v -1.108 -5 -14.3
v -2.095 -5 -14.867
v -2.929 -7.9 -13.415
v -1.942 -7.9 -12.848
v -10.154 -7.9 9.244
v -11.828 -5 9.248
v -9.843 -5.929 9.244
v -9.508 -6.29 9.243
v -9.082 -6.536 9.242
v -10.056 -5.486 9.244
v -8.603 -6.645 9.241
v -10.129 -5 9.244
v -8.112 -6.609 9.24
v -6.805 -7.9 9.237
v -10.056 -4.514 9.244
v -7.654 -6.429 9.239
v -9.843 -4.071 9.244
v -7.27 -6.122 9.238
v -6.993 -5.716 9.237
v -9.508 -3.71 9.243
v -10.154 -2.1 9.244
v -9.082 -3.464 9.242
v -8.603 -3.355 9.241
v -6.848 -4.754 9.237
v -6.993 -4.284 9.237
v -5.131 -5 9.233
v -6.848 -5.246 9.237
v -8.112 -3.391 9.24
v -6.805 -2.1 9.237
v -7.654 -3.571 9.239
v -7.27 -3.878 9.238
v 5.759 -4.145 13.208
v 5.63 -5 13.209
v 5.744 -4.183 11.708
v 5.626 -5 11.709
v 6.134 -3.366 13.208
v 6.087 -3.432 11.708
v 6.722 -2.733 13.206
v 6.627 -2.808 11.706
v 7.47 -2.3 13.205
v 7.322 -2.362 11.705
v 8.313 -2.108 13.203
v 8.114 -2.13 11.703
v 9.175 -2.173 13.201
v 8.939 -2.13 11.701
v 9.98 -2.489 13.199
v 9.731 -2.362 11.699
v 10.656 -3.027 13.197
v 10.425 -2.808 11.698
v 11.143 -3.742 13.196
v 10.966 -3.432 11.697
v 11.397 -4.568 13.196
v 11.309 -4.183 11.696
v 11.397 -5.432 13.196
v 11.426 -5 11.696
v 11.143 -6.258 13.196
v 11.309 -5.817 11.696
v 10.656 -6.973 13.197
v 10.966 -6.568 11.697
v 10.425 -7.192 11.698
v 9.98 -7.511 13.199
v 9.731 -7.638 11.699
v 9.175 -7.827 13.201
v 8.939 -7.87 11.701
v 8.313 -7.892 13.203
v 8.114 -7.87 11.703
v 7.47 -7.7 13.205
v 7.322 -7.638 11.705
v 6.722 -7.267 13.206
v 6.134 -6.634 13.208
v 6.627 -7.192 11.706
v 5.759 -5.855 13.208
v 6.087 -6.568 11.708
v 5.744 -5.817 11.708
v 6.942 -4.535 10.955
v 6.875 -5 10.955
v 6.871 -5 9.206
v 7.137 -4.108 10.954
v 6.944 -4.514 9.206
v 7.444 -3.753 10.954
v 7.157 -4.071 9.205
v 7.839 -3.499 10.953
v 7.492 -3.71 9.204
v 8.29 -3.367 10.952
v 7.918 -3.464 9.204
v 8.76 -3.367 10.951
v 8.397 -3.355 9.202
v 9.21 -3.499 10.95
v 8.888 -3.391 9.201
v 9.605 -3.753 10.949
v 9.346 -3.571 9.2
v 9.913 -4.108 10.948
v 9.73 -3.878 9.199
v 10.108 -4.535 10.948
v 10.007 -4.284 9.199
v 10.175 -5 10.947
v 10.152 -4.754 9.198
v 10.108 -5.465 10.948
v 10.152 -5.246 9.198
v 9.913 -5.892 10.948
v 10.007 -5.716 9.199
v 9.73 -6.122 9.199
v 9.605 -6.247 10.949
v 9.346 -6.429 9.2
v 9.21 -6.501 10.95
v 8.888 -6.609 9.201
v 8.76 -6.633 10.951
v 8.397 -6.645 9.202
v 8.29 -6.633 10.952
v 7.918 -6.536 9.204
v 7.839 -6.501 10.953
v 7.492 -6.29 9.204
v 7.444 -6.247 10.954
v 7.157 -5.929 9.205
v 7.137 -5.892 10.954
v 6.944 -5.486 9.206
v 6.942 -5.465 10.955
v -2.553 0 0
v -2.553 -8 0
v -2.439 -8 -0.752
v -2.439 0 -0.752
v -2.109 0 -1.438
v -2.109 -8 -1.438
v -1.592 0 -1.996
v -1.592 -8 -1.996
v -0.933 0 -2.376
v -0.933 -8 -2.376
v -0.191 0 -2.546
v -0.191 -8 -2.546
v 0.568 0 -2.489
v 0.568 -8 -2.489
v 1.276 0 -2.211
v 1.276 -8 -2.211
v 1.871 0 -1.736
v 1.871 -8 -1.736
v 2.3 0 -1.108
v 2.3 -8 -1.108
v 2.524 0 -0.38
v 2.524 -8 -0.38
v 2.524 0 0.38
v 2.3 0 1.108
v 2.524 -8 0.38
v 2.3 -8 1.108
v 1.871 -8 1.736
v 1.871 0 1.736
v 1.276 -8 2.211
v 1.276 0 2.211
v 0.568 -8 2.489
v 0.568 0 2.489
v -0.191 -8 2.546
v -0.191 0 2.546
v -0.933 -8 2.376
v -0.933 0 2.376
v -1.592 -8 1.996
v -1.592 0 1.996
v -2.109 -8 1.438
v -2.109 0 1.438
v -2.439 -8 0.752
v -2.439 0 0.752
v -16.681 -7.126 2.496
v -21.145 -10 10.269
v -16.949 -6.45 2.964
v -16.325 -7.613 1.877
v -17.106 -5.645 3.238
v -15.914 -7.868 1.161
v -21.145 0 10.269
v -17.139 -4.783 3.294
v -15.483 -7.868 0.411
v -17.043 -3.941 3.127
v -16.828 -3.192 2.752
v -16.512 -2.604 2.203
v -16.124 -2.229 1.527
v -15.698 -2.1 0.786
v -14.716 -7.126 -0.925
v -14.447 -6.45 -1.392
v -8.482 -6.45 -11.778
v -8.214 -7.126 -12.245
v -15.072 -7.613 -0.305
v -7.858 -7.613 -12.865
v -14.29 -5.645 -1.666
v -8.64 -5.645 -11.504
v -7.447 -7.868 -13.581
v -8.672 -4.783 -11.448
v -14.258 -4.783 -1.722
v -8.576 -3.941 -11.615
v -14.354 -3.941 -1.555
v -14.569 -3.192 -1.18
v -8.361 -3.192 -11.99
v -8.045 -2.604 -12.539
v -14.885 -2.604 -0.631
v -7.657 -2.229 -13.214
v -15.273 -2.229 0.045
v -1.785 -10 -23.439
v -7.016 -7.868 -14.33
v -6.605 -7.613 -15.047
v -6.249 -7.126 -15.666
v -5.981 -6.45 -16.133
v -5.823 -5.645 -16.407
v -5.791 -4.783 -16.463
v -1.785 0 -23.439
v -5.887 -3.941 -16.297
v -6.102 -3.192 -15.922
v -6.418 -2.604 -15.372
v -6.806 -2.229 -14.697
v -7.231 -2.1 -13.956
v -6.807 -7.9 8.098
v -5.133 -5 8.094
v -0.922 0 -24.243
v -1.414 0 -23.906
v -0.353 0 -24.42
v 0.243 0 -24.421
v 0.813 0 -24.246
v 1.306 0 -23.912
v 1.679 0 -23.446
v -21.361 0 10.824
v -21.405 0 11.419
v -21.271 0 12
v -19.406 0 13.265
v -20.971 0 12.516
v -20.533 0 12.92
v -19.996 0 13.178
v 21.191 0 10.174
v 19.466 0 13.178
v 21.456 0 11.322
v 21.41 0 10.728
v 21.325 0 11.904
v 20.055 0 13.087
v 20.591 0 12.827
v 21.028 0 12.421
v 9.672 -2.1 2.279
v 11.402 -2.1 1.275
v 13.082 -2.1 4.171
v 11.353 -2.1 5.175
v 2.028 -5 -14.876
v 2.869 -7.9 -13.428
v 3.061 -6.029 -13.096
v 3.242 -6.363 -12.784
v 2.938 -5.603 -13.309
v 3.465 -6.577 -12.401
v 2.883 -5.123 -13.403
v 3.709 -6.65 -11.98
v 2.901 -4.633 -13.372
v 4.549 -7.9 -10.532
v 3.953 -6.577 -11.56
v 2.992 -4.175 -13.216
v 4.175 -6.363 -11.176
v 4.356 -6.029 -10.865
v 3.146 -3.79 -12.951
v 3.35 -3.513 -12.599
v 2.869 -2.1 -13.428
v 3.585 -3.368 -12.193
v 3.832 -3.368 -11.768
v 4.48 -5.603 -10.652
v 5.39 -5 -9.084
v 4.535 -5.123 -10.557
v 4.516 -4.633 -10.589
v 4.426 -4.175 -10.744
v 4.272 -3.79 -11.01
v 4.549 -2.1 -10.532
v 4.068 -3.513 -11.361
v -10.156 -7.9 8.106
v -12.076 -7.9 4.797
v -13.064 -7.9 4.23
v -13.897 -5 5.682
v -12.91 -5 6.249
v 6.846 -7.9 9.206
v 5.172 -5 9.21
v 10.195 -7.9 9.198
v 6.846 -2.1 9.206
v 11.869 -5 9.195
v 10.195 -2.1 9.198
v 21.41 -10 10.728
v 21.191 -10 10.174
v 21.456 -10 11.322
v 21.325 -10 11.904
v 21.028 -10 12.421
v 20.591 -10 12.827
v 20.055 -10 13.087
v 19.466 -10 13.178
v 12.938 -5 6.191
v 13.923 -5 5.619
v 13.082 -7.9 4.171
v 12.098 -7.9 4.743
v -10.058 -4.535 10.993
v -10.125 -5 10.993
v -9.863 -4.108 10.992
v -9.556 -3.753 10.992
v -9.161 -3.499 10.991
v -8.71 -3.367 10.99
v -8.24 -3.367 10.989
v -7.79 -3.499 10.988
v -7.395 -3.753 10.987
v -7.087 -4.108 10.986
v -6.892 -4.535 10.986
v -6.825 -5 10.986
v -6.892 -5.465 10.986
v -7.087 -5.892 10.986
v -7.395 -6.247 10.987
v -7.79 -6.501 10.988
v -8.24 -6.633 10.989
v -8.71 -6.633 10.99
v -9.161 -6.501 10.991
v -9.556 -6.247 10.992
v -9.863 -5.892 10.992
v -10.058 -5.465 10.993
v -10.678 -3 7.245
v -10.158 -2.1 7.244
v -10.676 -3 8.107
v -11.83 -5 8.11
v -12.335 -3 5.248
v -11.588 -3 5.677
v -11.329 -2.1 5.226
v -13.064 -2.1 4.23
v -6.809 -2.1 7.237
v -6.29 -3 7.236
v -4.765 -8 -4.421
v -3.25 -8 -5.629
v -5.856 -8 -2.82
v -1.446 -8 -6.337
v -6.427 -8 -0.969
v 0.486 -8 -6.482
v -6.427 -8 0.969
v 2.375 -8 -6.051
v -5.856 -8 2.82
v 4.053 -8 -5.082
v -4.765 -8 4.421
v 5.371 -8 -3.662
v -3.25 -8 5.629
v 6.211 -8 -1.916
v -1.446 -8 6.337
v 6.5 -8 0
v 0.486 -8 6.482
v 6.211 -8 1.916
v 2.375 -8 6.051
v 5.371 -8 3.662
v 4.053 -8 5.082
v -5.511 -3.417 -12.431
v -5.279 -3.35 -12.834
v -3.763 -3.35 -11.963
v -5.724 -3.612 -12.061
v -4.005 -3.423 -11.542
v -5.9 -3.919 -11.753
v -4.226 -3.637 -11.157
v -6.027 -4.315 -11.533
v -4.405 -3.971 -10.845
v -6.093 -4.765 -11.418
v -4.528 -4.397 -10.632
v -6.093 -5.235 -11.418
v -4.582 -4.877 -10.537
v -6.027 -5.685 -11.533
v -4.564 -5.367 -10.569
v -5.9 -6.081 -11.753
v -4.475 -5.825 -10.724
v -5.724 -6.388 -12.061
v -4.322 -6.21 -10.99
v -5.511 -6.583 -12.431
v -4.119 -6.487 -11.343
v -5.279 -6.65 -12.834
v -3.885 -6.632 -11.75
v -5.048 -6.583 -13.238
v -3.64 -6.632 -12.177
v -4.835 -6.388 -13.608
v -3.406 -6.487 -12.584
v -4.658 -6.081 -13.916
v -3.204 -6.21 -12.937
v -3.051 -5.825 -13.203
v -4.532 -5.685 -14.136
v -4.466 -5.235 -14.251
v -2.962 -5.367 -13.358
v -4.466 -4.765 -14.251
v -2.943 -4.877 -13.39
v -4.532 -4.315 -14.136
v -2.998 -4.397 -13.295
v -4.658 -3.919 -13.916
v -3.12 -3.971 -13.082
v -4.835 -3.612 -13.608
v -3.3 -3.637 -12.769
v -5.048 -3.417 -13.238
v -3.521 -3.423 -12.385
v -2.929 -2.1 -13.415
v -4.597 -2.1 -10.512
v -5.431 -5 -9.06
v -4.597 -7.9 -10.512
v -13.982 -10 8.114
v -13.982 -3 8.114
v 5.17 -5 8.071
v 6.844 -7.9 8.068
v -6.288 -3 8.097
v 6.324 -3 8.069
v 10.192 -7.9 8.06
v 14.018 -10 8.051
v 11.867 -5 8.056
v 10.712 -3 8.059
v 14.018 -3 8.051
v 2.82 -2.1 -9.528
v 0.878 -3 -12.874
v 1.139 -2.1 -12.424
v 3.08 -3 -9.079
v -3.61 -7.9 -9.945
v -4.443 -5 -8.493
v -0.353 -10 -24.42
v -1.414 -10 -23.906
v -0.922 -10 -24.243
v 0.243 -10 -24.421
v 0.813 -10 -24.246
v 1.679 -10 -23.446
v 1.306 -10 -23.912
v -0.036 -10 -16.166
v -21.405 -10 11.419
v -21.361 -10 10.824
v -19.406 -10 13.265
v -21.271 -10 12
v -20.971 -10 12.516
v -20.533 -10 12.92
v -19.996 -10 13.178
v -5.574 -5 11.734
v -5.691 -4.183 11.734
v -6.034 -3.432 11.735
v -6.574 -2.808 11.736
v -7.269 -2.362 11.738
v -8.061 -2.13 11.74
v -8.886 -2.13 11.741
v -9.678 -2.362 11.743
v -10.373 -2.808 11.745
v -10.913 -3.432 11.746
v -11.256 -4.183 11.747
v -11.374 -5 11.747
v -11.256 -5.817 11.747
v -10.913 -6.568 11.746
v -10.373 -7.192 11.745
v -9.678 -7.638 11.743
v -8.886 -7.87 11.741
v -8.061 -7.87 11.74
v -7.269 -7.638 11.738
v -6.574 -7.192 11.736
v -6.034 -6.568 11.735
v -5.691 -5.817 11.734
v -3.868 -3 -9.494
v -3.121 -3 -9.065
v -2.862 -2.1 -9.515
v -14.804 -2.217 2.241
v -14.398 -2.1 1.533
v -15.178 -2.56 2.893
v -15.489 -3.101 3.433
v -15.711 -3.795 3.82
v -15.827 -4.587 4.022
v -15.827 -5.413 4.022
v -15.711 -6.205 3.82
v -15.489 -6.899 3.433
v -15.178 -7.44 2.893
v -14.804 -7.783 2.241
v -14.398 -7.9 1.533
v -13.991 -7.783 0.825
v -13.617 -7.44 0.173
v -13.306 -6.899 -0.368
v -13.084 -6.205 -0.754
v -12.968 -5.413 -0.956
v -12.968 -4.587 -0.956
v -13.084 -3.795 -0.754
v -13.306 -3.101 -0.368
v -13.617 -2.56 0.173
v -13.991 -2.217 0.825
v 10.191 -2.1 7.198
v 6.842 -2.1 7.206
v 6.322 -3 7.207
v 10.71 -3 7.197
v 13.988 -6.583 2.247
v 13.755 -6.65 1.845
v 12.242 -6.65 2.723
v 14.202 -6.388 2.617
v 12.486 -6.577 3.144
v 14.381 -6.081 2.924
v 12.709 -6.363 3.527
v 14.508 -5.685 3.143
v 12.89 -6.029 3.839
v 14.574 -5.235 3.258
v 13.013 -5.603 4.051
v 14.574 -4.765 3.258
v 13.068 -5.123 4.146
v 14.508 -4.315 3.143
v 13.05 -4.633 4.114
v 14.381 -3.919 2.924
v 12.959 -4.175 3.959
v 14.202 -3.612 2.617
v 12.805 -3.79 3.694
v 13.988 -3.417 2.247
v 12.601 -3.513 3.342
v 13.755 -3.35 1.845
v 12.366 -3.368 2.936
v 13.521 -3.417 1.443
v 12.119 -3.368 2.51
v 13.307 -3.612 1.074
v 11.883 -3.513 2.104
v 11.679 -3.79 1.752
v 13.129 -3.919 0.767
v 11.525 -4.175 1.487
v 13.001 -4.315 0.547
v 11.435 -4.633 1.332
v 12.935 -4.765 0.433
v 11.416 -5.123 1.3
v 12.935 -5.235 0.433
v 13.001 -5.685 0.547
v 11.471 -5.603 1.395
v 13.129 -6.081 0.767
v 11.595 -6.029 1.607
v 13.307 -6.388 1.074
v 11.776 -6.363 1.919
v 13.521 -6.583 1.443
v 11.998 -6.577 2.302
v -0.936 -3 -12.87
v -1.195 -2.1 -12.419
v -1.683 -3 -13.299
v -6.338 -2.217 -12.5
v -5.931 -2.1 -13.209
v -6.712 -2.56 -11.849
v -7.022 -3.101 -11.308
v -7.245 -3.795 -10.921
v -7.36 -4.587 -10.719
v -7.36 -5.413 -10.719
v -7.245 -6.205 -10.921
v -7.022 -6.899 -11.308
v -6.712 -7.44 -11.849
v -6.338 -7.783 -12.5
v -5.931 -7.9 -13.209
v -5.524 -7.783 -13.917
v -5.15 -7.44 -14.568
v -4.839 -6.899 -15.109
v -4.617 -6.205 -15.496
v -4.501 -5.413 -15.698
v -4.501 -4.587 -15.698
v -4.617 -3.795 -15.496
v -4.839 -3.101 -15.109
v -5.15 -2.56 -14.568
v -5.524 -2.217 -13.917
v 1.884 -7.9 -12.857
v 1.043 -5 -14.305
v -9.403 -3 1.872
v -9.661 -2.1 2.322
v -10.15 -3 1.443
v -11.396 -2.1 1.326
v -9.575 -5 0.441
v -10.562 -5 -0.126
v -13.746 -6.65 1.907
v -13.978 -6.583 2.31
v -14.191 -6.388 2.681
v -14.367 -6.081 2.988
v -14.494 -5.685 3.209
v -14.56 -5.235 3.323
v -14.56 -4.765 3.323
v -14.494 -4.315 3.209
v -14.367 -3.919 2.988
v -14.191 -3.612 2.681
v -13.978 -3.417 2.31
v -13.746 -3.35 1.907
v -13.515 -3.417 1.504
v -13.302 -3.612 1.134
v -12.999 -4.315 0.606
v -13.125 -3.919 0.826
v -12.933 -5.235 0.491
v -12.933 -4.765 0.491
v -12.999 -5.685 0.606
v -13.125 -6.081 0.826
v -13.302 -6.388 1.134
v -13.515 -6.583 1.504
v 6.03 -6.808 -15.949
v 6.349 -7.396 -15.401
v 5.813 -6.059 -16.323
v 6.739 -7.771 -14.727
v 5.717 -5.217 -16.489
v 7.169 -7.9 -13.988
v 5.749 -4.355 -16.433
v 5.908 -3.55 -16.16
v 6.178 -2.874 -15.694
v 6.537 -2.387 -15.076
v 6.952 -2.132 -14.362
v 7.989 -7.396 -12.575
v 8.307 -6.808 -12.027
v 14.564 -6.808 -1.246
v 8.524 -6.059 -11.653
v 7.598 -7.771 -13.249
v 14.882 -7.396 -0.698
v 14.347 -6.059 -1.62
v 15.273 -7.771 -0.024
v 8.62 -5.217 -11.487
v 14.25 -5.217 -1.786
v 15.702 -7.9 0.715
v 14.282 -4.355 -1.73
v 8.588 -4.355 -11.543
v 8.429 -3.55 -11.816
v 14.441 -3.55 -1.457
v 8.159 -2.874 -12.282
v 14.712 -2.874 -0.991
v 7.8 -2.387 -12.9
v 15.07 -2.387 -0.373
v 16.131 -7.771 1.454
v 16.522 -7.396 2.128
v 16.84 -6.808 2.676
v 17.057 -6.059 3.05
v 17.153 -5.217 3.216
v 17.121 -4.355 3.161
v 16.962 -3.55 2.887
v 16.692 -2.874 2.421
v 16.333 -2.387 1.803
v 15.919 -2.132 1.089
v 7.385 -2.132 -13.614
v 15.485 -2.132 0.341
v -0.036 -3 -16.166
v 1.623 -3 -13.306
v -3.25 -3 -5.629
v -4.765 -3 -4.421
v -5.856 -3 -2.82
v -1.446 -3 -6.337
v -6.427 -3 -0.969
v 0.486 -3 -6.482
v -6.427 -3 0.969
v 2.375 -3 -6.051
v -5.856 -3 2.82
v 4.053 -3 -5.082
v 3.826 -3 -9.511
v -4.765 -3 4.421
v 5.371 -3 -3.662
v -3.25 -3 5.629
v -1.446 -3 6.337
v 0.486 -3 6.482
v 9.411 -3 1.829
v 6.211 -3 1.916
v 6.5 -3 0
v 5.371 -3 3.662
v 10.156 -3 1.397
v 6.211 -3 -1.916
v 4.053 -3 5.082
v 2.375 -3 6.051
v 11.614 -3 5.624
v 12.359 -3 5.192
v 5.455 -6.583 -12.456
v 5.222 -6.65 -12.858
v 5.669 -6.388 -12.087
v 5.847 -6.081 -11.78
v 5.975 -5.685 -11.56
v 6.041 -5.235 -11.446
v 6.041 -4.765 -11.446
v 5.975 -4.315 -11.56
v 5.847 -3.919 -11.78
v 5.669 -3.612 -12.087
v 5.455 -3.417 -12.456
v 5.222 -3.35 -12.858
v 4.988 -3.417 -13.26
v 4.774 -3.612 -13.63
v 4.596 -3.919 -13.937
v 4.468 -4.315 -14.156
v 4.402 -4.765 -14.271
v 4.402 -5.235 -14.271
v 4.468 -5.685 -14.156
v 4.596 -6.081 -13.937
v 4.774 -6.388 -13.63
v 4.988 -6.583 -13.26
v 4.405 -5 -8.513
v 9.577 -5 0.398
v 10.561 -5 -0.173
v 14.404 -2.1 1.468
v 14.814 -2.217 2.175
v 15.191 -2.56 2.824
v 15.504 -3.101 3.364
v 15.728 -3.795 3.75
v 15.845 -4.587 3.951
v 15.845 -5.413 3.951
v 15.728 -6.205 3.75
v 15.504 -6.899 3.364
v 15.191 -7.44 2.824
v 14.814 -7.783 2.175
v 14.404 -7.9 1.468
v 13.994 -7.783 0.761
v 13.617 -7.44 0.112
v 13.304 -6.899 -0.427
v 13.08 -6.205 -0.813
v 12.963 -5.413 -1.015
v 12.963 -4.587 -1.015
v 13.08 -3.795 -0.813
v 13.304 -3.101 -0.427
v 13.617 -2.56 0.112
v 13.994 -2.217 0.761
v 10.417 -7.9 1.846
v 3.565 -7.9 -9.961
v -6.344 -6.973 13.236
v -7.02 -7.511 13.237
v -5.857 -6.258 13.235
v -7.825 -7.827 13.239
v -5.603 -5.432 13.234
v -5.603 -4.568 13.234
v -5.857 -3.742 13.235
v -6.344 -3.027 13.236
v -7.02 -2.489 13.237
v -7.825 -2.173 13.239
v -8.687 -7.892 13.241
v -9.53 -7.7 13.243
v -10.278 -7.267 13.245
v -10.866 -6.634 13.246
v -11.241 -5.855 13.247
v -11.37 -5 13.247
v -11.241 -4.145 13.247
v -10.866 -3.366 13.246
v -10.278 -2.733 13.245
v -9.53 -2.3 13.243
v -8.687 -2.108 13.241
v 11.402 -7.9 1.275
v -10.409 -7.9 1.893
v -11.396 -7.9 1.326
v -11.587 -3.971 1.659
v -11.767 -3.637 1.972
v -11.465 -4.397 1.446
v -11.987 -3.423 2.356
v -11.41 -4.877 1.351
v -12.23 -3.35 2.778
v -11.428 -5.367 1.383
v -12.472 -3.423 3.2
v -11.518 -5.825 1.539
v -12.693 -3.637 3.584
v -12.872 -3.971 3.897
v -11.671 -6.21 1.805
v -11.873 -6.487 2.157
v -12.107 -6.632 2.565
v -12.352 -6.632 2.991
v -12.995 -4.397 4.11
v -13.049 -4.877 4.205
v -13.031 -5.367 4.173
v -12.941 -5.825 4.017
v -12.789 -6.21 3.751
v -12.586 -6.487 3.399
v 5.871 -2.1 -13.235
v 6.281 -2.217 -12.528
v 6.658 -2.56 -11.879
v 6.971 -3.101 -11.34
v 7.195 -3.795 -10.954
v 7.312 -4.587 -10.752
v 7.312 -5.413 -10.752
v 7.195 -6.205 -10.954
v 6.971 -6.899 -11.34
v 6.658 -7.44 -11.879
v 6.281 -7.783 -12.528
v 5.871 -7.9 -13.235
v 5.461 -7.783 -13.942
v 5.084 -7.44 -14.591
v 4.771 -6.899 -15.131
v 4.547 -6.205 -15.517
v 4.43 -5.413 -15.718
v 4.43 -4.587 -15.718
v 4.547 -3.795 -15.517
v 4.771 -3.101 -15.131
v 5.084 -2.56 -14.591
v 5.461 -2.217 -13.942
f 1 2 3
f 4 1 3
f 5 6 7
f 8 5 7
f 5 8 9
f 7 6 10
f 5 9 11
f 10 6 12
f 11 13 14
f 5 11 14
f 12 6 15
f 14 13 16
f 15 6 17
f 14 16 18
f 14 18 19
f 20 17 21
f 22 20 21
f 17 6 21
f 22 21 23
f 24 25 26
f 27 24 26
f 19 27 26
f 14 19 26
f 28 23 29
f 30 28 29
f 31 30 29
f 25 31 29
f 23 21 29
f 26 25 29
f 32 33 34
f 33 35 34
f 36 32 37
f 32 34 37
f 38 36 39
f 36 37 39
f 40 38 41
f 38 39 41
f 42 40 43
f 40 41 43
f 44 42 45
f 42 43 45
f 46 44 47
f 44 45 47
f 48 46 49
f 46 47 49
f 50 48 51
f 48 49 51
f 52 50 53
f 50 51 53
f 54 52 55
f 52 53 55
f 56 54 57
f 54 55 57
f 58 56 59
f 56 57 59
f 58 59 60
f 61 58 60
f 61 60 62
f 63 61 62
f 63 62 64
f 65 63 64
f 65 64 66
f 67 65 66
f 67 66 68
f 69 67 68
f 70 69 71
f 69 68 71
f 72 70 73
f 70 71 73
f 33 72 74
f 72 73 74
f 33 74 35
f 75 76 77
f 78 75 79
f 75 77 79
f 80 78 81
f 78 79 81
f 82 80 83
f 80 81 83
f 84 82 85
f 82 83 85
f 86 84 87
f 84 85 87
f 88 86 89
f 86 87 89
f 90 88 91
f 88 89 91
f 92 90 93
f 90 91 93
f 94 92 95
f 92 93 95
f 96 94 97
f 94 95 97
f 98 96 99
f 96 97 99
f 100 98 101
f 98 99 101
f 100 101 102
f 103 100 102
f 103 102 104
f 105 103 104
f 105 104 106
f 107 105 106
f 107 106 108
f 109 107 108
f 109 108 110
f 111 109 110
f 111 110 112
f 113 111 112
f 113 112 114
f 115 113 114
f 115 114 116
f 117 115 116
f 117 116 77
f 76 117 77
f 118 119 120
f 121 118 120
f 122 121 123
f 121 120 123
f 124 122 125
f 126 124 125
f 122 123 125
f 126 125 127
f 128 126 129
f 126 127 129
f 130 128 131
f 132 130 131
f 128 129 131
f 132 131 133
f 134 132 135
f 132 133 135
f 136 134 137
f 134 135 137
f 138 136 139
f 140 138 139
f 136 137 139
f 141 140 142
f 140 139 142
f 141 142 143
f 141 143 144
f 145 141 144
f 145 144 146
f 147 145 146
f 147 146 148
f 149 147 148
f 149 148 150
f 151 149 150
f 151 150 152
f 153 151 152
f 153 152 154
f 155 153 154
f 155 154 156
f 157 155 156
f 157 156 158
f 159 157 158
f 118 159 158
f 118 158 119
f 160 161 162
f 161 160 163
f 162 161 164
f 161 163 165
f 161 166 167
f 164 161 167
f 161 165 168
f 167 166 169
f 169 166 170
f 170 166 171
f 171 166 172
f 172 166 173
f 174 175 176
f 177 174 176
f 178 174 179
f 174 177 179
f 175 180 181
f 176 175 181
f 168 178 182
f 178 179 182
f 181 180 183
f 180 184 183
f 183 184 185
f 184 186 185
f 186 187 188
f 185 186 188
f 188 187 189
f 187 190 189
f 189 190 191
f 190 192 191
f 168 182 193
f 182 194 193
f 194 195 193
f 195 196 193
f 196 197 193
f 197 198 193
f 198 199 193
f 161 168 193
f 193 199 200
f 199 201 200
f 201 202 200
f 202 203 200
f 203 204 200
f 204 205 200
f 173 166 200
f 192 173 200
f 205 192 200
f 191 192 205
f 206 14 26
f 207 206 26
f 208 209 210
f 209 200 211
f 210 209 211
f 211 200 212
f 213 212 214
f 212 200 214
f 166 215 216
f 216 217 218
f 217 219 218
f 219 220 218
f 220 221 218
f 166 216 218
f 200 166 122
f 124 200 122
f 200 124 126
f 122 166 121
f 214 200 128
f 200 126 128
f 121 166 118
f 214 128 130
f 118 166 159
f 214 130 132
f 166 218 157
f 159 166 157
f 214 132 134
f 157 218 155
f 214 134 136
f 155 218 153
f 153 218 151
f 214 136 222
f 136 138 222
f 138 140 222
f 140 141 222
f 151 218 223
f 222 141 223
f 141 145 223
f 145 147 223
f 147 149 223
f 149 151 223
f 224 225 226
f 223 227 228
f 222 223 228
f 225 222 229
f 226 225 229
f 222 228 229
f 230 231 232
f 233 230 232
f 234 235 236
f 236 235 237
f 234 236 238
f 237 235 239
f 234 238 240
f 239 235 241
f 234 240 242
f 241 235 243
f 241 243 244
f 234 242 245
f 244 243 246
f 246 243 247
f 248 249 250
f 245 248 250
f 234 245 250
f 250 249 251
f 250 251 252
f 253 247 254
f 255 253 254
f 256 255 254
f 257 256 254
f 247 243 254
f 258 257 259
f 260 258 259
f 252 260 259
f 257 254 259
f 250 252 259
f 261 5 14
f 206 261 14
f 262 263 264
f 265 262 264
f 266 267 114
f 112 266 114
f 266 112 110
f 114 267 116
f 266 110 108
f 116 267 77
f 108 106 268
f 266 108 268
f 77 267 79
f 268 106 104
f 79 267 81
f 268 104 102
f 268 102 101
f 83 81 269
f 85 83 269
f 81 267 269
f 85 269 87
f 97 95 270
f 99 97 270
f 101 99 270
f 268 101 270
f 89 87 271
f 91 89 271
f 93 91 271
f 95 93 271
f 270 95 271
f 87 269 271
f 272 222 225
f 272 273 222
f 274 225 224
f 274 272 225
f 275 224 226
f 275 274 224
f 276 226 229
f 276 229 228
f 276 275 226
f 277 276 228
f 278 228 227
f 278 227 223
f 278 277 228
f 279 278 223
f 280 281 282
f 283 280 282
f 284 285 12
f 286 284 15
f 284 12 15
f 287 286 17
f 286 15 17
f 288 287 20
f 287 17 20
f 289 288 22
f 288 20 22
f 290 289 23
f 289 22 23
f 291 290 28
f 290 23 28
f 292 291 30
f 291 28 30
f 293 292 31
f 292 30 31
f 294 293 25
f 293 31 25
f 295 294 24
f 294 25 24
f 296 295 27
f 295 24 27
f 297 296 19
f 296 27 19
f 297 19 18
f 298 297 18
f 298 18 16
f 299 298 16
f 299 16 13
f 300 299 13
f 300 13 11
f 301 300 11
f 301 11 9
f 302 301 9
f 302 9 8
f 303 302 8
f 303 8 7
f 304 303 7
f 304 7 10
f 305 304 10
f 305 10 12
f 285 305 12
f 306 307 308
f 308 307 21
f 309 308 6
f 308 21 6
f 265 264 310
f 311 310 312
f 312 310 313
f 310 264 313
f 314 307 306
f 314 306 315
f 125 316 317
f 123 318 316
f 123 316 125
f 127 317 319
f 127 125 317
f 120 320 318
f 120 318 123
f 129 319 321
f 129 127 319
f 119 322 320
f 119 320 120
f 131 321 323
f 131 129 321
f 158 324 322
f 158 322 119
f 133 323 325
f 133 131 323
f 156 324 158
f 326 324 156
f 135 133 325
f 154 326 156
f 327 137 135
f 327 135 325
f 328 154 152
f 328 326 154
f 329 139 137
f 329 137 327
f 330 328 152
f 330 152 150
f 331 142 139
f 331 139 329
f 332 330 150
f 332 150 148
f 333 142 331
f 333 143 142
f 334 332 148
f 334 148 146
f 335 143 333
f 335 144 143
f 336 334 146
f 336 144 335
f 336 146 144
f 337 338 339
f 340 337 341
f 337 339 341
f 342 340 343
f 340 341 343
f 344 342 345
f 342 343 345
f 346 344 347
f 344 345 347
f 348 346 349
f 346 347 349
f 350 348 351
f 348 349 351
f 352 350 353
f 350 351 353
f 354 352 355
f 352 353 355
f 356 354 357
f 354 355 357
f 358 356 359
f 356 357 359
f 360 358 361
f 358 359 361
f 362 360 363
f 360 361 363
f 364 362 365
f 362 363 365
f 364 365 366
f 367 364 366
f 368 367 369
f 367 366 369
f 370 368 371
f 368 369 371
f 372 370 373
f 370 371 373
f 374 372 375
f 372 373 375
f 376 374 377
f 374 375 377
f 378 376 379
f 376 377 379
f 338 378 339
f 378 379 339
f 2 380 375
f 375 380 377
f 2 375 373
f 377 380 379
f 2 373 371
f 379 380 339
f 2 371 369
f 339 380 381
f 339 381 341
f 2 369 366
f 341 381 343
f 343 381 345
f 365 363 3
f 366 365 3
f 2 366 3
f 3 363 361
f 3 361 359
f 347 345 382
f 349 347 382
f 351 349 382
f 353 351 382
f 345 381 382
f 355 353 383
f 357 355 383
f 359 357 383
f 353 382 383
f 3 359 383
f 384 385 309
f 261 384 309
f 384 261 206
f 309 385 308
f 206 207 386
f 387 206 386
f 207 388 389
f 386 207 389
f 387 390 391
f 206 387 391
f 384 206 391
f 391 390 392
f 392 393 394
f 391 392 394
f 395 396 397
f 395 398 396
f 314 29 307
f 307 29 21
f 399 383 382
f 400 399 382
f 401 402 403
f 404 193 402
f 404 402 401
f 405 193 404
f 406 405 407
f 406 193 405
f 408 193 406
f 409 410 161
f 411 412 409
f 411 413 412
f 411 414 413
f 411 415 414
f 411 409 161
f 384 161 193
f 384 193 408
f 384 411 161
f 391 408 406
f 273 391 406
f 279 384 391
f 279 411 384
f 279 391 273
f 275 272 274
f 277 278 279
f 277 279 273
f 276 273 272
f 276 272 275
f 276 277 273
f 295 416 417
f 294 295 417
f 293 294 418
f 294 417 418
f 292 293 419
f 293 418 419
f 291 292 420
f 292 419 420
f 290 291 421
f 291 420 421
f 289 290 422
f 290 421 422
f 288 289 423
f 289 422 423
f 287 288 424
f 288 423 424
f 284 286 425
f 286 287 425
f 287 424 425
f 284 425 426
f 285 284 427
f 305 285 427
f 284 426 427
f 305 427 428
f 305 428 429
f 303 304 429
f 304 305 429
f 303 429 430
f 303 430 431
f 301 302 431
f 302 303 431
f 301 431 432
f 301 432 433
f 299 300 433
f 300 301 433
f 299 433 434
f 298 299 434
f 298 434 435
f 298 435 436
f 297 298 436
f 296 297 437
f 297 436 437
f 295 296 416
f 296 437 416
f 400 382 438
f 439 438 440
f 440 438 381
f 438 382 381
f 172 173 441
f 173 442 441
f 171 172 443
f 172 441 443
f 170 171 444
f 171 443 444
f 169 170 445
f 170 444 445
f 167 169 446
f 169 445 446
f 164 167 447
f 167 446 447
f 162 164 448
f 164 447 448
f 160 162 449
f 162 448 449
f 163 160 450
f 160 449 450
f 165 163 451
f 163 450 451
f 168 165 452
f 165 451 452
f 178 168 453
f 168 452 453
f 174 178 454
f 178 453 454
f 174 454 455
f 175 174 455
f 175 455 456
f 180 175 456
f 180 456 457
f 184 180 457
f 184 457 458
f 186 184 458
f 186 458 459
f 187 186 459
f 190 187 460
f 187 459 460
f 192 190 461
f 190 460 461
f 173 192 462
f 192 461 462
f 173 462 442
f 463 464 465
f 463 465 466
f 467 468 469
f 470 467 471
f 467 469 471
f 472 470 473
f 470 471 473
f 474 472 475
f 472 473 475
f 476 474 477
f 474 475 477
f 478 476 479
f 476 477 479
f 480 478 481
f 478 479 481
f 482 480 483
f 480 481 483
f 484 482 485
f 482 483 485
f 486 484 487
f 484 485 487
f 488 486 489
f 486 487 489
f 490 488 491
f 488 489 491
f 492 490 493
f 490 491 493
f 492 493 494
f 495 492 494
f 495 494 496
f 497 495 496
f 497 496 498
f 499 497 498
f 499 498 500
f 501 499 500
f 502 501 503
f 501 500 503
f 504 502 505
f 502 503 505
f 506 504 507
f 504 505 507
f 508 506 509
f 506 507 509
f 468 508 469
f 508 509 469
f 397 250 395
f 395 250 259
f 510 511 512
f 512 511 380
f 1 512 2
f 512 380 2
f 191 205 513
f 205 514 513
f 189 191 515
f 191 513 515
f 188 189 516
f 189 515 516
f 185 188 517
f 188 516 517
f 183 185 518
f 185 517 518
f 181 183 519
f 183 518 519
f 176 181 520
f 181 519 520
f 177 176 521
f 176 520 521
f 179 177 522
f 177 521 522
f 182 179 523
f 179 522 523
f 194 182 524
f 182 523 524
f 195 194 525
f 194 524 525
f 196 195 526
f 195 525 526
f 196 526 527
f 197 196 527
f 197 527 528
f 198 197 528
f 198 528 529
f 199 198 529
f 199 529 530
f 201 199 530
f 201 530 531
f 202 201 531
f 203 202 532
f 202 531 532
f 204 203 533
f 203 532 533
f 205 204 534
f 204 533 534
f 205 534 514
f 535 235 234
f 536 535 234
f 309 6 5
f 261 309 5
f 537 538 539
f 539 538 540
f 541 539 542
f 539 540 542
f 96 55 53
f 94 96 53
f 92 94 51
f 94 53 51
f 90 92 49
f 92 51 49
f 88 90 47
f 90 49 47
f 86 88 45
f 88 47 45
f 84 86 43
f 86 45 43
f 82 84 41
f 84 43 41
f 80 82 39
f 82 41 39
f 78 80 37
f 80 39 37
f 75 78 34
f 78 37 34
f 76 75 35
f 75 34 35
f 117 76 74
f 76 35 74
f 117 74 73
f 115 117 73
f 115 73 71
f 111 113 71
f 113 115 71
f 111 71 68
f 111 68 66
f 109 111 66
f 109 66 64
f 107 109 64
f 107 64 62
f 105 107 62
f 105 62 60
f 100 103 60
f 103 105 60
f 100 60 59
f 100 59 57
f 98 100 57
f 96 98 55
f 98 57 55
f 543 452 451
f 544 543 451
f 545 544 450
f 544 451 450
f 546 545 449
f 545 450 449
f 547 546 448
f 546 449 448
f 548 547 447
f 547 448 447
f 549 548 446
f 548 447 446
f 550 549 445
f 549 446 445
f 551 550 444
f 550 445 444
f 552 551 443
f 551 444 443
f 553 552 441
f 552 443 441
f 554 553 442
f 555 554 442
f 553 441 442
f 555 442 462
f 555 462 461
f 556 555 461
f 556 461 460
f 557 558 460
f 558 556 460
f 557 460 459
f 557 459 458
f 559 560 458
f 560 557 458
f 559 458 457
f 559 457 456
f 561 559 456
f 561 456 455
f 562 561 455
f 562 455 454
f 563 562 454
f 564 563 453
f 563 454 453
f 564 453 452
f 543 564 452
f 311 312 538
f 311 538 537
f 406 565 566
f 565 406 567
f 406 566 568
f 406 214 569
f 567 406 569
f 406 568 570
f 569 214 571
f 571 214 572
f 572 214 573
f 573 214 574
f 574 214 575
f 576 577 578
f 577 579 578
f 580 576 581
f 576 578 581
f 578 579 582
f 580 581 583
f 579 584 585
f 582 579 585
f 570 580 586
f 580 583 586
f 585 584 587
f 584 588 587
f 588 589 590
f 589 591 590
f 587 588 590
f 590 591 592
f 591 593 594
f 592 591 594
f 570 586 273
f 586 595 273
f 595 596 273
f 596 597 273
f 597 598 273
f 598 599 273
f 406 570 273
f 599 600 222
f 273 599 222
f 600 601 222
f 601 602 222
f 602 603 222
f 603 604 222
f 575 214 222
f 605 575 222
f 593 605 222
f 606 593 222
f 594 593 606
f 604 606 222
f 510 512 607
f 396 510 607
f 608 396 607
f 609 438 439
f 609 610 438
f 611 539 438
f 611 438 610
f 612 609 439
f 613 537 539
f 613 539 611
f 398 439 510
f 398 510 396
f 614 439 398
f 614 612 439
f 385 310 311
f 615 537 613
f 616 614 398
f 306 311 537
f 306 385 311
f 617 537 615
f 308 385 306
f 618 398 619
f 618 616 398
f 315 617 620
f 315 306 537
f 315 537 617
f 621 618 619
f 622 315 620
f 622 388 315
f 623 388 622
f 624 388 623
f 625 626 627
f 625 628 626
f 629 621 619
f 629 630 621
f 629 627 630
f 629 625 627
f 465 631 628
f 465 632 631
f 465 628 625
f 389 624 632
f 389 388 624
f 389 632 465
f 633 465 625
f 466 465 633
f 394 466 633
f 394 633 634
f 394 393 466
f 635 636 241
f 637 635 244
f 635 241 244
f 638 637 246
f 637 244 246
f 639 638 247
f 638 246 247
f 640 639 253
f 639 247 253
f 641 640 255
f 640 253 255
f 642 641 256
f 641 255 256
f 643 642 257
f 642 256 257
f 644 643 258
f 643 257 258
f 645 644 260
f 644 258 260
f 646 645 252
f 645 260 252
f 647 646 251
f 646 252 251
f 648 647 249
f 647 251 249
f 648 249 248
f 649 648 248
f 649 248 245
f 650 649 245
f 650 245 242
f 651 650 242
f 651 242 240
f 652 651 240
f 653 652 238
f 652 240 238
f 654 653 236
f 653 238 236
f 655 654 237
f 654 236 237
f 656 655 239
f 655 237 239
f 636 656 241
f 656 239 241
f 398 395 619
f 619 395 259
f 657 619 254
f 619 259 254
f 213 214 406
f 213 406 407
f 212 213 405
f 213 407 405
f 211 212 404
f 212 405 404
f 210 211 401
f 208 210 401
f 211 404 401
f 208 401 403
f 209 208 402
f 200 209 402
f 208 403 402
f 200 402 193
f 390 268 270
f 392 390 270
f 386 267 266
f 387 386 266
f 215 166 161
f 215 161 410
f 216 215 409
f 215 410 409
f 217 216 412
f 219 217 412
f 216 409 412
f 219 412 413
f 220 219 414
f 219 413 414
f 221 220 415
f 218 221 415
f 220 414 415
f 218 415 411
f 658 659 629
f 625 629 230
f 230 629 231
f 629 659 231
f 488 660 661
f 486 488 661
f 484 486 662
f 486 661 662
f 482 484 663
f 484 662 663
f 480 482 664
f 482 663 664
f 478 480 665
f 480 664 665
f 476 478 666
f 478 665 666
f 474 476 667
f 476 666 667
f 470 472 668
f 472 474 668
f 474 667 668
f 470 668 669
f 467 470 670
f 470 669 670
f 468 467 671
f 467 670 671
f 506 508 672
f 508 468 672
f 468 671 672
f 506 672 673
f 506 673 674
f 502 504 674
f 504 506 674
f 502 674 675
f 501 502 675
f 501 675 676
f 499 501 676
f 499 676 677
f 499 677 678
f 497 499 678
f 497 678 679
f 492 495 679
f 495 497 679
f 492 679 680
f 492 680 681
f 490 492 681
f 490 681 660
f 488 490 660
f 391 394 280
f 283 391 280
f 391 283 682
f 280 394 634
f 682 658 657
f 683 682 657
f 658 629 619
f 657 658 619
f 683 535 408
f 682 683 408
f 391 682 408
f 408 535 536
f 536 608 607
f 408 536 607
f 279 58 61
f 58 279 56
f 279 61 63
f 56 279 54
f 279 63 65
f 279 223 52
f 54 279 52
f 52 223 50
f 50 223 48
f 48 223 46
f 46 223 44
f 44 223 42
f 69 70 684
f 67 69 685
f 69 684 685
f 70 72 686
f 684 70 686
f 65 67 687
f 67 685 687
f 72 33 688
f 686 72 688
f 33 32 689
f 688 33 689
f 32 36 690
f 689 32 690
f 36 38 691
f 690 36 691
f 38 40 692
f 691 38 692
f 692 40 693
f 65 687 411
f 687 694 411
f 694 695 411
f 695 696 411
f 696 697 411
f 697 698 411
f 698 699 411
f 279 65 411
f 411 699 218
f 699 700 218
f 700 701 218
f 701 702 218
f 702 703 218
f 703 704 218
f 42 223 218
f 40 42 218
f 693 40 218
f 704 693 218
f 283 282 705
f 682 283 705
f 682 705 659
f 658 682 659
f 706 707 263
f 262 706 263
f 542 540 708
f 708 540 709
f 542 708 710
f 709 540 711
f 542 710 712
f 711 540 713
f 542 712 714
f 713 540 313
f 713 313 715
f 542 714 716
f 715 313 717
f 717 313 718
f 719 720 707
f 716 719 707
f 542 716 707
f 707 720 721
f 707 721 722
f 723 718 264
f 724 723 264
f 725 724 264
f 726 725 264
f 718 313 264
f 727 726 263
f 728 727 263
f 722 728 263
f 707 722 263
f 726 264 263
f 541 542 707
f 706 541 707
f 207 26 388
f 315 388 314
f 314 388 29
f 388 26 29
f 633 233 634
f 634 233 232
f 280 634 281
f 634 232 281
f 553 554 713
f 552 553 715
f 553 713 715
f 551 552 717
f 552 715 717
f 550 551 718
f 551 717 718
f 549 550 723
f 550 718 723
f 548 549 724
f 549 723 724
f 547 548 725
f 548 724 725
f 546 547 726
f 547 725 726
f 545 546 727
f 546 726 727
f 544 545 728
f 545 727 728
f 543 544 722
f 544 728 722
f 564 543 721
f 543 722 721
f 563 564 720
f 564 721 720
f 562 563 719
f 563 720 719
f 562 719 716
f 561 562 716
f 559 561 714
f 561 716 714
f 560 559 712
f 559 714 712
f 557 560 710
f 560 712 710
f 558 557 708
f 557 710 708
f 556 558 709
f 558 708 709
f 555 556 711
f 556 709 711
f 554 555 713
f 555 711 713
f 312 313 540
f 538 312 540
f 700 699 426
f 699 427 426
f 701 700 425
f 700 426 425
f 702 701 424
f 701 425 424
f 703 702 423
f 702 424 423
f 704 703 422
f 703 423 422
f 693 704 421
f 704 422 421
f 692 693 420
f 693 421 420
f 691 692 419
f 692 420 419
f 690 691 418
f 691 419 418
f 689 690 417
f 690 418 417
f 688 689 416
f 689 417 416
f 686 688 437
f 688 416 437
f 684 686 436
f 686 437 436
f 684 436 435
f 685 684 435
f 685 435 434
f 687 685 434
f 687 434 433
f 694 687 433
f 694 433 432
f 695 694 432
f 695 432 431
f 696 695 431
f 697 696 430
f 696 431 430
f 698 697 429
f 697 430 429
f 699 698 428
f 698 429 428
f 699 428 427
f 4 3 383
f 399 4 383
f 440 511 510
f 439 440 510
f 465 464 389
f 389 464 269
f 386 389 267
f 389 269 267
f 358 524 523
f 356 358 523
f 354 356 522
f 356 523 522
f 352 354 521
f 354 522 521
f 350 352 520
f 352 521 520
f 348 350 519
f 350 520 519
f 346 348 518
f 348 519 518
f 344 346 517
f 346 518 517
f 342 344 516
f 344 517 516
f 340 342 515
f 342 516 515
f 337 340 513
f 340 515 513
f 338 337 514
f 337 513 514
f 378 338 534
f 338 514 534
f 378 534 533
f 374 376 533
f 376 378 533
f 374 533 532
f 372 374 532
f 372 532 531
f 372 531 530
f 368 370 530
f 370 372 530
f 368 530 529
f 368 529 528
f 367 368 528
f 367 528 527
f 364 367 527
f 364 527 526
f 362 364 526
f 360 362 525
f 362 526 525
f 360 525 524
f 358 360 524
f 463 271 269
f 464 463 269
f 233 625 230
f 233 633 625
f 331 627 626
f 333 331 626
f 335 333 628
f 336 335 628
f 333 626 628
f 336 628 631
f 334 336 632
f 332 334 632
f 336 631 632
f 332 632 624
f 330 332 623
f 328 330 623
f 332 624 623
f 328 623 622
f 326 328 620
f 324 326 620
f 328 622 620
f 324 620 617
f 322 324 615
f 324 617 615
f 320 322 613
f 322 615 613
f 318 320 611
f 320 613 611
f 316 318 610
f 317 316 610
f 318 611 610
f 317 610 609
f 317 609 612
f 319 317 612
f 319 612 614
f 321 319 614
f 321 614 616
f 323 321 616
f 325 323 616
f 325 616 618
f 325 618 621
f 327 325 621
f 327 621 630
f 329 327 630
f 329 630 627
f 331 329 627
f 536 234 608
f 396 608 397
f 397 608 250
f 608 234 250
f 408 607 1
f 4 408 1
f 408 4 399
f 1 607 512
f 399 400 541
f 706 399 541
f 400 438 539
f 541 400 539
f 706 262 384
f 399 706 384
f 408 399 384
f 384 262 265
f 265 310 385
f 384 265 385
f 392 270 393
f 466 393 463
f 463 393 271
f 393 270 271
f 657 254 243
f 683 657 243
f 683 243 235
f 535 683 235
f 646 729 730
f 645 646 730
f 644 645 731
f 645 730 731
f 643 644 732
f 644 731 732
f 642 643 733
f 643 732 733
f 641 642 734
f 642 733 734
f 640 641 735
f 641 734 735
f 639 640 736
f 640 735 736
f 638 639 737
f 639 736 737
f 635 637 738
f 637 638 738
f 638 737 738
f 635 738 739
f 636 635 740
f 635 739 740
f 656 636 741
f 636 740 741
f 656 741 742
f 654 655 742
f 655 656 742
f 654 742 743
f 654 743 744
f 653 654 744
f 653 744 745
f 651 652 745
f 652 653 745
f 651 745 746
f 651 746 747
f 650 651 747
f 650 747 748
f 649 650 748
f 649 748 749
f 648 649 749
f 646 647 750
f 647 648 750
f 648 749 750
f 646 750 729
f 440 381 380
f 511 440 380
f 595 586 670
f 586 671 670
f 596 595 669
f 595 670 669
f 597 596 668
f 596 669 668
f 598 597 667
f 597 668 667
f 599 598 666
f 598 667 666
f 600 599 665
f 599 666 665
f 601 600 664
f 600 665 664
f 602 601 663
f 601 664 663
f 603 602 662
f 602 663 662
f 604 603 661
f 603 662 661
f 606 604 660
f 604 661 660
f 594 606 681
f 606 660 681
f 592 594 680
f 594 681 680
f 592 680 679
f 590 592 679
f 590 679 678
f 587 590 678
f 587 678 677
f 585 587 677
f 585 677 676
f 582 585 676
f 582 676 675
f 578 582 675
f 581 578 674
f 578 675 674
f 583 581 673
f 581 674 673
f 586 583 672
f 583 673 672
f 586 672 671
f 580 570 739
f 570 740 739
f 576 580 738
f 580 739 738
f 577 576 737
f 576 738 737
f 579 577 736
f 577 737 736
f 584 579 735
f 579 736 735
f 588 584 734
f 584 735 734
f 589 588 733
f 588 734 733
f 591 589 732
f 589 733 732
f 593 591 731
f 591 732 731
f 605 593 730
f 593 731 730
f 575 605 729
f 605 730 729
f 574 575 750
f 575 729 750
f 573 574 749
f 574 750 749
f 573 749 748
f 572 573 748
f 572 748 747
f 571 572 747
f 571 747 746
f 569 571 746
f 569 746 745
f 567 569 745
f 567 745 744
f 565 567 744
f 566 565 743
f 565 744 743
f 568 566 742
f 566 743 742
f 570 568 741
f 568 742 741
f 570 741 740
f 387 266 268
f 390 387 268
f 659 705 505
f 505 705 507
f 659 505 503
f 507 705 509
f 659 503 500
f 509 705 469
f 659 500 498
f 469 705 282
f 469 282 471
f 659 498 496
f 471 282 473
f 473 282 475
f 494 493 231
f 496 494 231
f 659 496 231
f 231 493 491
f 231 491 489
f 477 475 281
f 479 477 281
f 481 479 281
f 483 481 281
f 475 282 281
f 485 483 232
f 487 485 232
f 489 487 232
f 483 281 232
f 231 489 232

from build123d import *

# Parameters (mm, degrees)
F0_R      = 6.5
F1_DEPTH  = 3
F2_DEPTH  = 10
F4_D      = 3.3
F4_DEPTH  = 8
F4_TIP    = 0.9914200214
F5_D      = 5.8
F5_DEPTH  = 1.5
F5_TIP    = 1.7424957952
F6_START  = -4
F6_DEPTH  = 2
F8_START  = -4
F8_DEPTH  = 2
F9_D      = 5.8
F9_DEPTH  = 1.5
F9_TIP    = 1.7424957952
F10_D     = 3.3
F10_DEPTH = 8
F10_START = 2.2510758
F10_TIP   = 0.9914200214
F12_START = -4
F12_DEPTH = 2
F13_D     = 3.3
F13_DEPTH = 8
F13_TIP   = 0.9914200214
F14_D     = 5.8
F14_DEPTH = 1.5
F14_TIP   = 1.7424957952
F15_R     = 2
F16_DEPTH = 8
F17_D     = 5.1054
F17_DEPTH = 15.81
F17_TIP   = 1.5338169022


with BuildPart() as f1:
    # F0 (on Front) → F1 (new body)
    with BuildSketch(Plane.XZ):
        Polygon((-0.0364092433, -16.1657665361), (14.0181691136, 8.0513519384), (-13.9817598703, 8.1144145977), align=None)
        Circle(F0_R, mode=Mode.SUBTRACT)
    extrude(amount=F1_DEPTH)

    # F0 (on Front) → F2 (join)
    with BuildSketch(Plane.XZ):
        Polygon((-0.0595551194, -26.4425752627), (22.9297194786, 13.169711385), (-22.8701643592, 13.2728638777), align=None)
        Polygon((-13.9817598703, 8.1144145977), (14.0181691136, 8.0513519384), (-0.0364092433, -16.1657665361), align=None, mode=Mode.SUBTRACT)
    extrude(amount=F2_DEPTH)

    # F4
    with Locations(Plane(origin=(11.4350821796, 0, -6.6364319388), x_dir=(0, 1, 0), z_dir=(0.8648970884, 0, -0.501949227))):
        with Locations((-5, -8.5), (-5, 8.5)):
            Hole(F4_D / 2, depth=F4_DEPTH)
            with Locations((0, 0, -(F4_DEPTH + F4_TIP / 2))):  # 118° drill point
                Cone(0, F4_D / 2, F4_TIP, mode=Mode.SUBTRACT)

    # F5
    with Locations(Plane(origin=(11.4350821796, 0, -6.6364319388), x_dir=(0, 1, 0), z_dir=(0.8648970884, 0, -0.501949227))):
        with Locations((-5, -8.5), (-5, 8.5)):
            Hole(F5_D / 2, depth=F5_DEPTH)
            with Locations((0, 0, -(F5_DEPTH + F5_TIP / 2))):  # 118° drill point
                Cone(0, F5_D / 2, F5_TIP, mode=Mode.SUBTRACT)

    # F3 (on face) → F6 (cut)
    with BuildSketch(Plane(origin=(11.4350821796, 0, -6.6364319388), x_dir=(0, 1, 0), z_dir=(0.8648970884, 0, -0.501949227)).offset(F6_START)):
        Polygon((-2.1, -10.1743157806), (-2.1, -6.8256842194), (-5, -5.1513684387), (-7.9, -6.8256842194), (-7.9, -10.1743157806), (-5, -11.8486315613), align=None)
        Polygon((-2.1, 6.8256842194), (-2.1, 10.1743157806), (-5, 11.8486315613), (-7.9, 10.1743157806), (-7.9, 6.8256842194), (-5, 5.1513684387), align=None)
    extrude(amount=-F6_DEPTH, mode=Mode.SUBTRACT)

    # F7 (on face) → F8 (cut)
    with BuildSketch(Plane(origin=(0.0297775597, 0, 13.2212876313), x_dir=(0.9999974637, 0, -0.0022522378), z_dir=(0.0022522378, 0, 0.9999974637)).offset(F8_START)):
        Polygon((6.8256842194, -2.1), (5.1513684387, -5), (6.8256842194, -7.9), (10.1743157806, -7.9), (11.8486315613, -5), (10.1743157806, -2.1), align=None)
        Polygon((-10.1743157806, -2.1), (-11.8486315613, -5), (-10.1743157806, -7.9), (-6.8256842194, -7.9), (-5.1513684387, -5), (-6.8256842194, -2.1), align=None)
    extrude(amount=-F8_DEPTH, mode=Mode.SUBTRACT)

    # F9
    with Locations(Plane(origin=(0.0297775597, 0, 13.2212876313), x_dir=(0.9999974637, 0, -0.0022522378), z_dir=(0.0022522378, 0, 0.9999974637))):
        with Locations((8.5, -5), (-8.5, -5)):
            Hole(F9_D / 2, depth=F9_DEPTH)
            with Locations((0, 0, -(F9_DEPTH + F9_TIP / 2))):  # 118° drill point
                Cone(0, F9_D / 2, F9_TIP, mode=Mode.SUBTRACT)

    # F10
    # its depths count from where the whole tool has entered the part; down to there all is cleared
    with Locations(Plane(origin=(0.0297775597, 0, 13.2212876313), x_dir=(0.9999974637, 0, -0.0022522378), z_dir=(0.0022522378, 0, 0.9999974637)).offset(-F10_START)):
        with Locations((8.5, -5), (-8.5, -5)):
            Hole(F10_D / 2, depth=F10_DEPTH)
            with Locations((0, 0, -(F10_DEPTH + F10_TIP / 2))):  # 118° drill point
                Cone(0, F10_D / 2, F10_TIP, mode=Mode.SUBTRACT)

    # F11 (on face) → F12 (cut)
    with BuildSketch(Plane(origin=(-11.4648597393, 0, -6.5848556925), x_dir=(0, -1, 0), z_dir=(-0.8671493262, 0, -0.4980482367)).offset(F12_START)):
        Polygon((2.1, 6.8256842194), (5, 5.1513684387), (7.9, 6.8256842194), (7.9, 10.1743157806), (5, 11.8486315613), (2.1, 10.1743157806), align=None)
        Polygon((2.1, -10.1743157806), (5, -11.8486315613), (7.9, -10.1743157806), (7.9, -6.8256842194), (5, -5.1513684387), (2.1, -6.8256842194), align=None)
    extrude(amount=-F12_DEPTH, mode=Mode.SUBTRACT)

    # F13
    with Locations(Plane(origin=(-11.4648597393, 0, -6.5848556925), x_dir=(0, -1, 0), z_dir=(-0.8671493262, 0, -0.4980482367))):
        with Locations((5, 8.5), (5, -8.5)):
            Hole(F13_D / 2, depth=F13_DEPTH)
            with Locations((0, 0, -(F13_DEPTH + F13_TIP / 2))):  # 118° drill point
                Cone(0, F13_D / 2, F13_TIP, mode=Mode.SUBTRACT)

    # F14
    with Locations(Plane(origin=(-11.4648597393, 0, -6.5848556925), x_dir=(0, -1, 0), z_dir=(-0.8671493262, 0, -0.4980482367))):
        with Locations((5, 8.5), (5, -8.5)):
            Hole(F14_D / 2, depth=F14_DEPTH)
            with Locations((0, 0, -(F14_DEPTH + F14_TIP / 2))):  # 118° drill point
                Cone(0, F14_D / 2, F14_TIP, mode=Mode.SUBTRACT)

    # F15
    f15_edges = [f1.edges().sort_by_distance(p)[0] for p in [
        (-22.870164, -5, 13.272864),
        (-0.059555, -5, -26.442575),
        (22.929719, -5, 13.169711),
    ]]
    fillet(f15_edges, radius=F15_R)

    # F0 (on Front) → F16 (join)
    with BuildSketch(Plane.XZ):
        Circle(F0_R)
    extrude(amount=F16_DEPTH)

    # F17
    with Locations(Plane(origin=(0, 0, 0), x_dir=(1, 0, 0), z_dir=(0, 1, 0))):
        with Locations((0, 0)):
            Hole(F17_D / 2, depth=F17_DEPTH)
            with Locations((0, 0, -(F17_DEPTH + F17_TIP / 2))):  # 118° drill point
                Cone(0, F17_D / 2, F17_TIP, mode=Mode.SUBTRACT)


solid = f1.part
